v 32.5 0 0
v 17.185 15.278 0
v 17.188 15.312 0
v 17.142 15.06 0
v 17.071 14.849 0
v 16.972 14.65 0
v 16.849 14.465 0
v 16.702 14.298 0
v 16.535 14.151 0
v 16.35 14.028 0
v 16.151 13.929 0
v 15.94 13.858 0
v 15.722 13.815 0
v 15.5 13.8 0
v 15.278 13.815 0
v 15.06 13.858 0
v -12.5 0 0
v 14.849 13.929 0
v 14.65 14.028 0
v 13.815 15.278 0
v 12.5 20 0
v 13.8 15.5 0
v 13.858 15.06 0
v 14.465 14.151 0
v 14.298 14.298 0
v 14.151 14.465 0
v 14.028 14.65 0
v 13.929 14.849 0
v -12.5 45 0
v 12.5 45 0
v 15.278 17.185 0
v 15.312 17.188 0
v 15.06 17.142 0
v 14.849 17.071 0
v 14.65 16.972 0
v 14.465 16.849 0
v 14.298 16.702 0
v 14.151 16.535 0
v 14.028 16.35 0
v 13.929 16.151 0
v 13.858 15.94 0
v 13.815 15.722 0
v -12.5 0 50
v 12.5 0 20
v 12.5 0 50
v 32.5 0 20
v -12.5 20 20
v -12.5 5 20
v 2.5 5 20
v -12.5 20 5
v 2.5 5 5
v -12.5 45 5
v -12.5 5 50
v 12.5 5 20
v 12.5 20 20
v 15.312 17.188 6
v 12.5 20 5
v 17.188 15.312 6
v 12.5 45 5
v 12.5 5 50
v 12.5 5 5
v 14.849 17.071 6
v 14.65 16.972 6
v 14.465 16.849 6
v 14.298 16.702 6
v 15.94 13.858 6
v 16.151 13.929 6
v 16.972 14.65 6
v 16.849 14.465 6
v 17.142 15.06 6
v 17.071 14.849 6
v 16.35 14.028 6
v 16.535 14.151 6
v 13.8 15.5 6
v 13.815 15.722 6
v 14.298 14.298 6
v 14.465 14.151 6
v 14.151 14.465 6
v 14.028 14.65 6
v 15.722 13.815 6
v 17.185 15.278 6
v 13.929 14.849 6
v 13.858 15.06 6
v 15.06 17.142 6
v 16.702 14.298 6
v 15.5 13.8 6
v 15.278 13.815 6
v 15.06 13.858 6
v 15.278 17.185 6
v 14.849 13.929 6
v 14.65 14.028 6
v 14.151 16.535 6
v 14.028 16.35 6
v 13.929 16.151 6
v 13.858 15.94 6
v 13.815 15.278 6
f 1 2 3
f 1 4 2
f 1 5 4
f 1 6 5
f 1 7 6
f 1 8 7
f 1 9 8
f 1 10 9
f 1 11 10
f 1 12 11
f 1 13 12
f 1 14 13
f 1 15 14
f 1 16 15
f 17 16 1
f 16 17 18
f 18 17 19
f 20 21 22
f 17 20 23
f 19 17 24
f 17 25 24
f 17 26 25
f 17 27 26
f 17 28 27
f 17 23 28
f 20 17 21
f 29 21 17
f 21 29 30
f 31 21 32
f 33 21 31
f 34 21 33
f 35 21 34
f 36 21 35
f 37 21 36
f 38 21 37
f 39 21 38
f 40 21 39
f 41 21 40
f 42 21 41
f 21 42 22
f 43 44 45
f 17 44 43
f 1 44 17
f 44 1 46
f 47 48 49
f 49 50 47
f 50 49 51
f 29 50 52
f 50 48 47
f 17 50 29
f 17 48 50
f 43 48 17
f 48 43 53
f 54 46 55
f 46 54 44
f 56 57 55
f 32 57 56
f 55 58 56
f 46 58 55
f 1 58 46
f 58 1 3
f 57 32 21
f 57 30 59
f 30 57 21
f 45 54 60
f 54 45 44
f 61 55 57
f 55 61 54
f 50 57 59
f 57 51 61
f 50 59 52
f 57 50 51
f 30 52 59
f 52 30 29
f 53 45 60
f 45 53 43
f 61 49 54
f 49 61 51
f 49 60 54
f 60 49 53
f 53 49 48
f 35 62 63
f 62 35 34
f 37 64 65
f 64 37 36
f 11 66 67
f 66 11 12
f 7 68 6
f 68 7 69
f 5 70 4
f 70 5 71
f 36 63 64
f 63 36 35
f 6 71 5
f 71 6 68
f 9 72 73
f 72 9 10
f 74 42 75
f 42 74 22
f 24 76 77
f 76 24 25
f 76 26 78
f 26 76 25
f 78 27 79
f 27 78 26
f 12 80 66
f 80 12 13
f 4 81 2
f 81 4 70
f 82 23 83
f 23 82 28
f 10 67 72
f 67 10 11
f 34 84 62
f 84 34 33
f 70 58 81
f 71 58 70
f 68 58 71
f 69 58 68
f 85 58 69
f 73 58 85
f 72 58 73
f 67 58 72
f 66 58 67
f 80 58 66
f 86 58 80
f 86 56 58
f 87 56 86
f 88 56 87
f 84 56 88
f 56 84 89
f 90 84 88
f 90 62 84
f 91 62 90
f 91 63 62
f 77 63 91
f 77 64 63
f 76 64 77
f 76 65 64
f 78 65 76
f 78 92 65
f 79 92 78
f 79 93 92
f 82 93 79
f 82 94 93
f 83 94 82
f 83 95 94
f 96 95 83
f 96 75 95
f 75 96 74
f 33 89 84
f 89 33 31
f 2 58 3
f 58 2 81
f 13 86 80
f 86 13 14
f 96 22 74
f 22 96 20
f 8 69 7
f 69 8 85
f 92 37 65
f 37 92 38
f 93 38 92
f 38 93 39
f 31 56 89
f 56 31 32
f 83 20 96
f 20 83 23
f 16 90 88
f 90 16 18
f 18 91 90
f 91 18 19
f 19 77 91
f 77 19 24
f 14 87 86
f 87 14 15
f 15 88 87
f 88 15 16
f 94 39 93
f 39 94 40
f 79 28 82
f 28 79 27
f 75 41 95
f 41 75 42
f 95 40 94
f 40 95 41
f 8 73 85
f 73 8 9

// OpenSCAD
// L-shaped mounting bracket for a NEMA 17 stepper motor (e.g. a syringe pump).
// Base plate with two vertical through-holes; vertical motor plate with a centring
// boss hole and a screw pattern; two triangular gussets at the edges.
//

base_x  = 25;
base_y  = 45;
base_z  = 5;
screw_h = 4.5;

motor_x = 25;
motor_y = 5;
motor_z = 50;
boss_h  = 23;
screw_p = 31;
screw_d = 3.4;

gusset_t = 5;
gusset_l = 20;
gusset_h = 20;

$fn = 48;

base_holes = [
    [-17, 30],
    [17, 30]
];

motor_hole = [0, 25, 28];
screw_grid = [
    [-15.5, -15.5],
    [-15.5, 15.5],
    [15.5, -15.5],
    [15.5, 15.5]
];

difference() {
    union() {
        translate([-base_x / 2, 0, 0]) cube([base_x, base_y, base_z]);
        translate([-motor_x / 2, 0, 0]) cube([motor_x, motor_y, motor_z]);
        for (x = [-base_x / 2, base_x / 2])
            translate([x, 0, 0]) linear_extrude(gusset_h) polygon([[0, 0], [gusset_l, 0], [0, gusset_l]]);
    }
    for (p = base_holes)
        translate(p) cylinder(h = base_z + 1, d = screw_h);
    translate(motor_hole) cylinder(h = motor_y + 1, d = boss_h);
    for (p = screw_grid)
        translate([p[0], p[1], -1]) cylinder(h = motor_y + 2, d = screw_d);
}
